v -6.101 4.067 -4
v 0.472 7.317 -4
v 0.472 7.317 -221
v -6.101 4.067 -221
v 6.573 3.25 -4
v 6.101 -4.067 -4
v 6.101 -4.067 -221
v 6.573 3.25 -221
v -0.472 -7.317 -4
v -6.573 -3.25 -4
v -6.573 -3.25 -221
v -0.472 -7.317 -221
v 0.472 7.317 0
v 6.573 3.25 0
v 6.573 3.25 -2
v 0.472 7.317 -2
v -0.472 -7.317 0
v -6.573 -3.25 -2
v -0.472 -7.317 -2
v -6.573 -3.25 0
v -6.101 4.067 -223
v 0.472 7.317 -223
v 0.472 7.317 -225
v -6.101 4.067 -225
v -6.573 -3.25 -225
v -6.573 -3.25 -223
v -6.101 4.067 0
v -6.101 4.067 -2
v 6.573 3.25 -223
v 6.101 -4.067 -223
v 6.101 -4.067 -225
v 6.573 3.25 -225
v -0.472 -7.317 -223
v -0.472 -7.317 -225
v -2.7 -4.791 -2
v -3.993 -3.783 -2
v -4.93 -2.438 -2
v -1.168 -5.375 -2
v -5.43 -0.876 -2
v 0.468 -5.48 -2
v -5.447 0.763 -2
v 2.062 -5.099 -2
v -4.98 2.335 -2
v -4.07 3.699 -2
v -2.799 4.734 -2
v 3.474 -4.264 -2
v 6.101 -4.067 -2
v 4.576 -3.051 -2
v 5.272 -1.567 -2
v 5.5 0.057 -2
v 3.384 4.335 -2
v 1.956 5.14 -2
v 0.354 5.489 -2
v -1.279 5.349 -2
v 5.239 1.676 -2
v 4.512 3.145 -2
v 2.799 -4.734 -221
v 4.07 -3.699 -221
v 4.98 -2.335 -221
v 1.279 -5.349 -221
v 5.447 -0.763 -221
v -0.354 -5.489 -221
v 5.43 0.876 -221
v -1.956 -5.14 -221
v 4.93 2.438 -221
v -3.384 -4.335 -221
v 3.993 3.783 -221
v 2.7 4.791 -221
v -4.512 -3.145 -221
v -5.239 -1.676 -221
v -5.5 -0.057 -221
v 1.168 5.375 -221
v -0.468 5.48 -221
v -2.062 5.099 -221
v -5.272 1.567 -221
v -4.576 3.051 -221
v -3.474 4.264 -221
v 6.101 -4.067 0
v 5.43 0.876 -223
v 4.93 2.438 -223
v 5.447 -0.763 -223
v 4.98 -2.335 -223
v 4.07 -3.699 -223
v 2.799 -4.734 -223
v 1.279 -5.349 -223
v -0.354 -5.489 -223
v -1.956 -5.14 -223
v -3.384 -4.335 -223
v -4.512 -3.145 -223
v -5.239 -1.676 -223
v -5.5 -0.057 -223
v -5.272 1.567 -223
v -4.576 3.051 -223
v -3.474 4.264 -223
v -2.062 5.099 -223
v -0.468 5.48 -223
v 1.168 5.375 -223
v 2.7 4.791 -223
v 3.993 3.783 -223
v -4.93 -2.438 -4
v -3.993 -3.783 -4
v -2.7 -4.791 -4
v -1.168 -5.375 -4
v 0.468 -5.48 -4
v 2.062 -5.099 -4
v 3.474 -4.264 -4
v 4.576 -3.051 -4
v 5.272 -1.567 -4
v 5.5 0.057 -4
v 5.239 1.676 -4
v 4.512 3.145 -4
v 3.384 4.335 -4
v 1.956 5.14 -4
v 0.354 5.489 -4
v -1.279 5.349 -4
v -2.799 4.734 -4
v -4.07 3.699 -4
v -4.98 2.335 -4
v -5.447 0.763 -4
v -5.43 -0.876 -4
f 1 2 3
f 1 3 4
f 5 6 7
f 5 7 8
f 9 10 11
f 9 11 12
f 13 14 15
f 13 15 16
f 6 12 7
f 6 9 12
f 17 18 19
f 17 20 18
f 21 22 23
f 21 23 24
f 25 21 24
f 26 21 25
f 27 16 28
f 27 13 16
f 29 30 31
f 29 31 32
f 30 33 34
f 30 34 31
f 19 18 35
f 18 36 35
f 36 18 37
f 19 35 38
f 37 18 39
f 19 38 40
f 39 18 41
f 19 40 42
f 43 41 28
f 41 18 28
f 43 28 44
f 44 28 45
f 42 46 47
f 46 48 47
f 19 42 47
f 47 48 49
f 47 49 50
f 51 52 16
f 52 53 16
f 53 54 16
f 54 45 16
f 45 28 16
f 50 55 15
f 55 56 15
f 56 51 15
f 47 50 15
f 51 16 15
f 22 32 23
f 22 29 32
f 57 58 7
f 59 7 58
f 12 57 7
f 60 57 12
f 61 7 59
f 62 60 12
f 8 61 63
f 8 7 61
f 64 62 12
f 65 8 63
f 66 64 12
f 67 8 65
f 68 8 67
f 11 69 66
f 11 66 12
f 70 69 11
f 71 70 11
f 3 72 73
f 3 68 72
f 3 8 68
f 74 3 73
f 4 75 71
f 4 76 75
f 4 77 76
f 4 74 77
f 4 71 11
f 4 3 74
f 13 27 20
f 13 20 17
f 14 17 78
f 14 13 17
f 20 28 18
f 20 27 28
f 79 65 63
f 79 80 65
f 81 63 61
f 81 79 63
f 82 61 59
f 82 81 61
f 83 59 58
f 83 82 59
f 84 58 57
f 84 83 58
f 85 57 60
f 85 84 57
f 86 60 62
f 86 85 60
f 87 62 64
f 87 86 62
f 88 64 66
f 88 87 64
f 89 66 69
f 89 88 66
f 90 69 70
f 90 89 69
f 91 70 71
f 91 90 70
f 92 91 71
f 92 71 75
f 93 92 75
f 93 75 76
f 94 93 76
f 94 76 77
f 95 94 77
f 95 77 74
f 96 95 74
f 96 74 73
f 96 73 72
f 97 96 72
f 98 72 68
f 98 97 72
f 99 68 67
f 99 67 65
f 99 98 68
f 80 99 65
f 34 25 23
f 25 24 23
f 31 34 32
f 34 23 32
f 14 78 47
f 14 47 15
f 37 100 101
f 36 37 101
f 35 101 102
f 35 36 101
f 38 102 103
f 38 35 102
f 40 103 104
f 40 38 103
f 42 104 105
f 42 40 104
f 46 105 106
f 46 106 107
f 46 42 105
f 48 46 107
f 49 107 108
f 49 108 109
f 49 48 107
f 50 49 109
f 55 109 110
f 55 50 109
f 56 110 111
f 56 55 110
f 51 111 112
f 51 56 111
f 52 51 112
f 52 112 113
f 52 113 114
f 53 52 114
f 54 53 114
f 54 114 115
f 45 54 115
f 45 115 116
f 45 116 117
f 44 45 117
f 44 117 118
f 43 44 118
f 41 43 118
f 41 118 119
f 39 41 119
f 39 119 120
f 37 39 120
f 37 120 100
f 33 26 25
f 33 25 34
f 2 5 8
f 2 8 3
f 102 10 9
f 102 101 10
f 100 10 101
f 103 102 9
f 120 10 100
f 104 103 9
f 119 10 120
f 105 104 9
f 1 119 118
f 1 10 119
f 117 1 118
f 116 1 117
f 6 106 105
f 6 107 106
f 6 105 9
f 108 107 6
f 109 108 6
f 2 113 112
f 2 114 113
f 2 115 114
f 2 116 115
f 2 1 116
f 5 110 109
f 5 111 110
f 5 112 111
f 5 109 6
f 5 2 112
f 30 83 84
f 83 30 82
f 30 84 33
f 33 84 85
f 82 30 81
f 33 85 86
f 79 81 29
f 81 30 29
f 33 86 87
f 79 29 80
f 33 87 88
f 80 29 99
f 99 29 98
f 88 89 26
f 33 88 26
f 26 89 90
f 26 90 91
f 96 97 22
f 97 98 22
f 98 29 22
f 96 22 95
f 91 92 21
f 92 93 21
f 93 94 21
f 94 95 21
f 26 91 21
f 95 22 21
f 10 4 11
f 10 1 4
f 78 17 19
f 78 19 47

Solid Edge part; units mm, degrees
sketch "Sketch1" plane through (0, 0, 0) normal (0, 0, 1) x (1, 0, 0)
  line L0 (-6.1009, 4.0673) -> (-6.5728, -3.2499)
  line L1 (-6.5728, -3.2499) -> (-0.4719, -7.3171)
  line L2 (-0.4719, -7.3171) -> (6.1009, -4.0673)
  line L3 (6.1009, -4.0673) -> (6.5728, 3.2499)
  line L4 (6.5728, 3.2499) -> (0.4719, 7.3171)
  line L5 (0.4719, 7.3171) -> (-6.1009, 4.0673)
extrude "Protrusion1" add sketch "Sketch1" against normal blind 225
sketch "Sketch2" plane through (0, 0, -2) normal (0, 0, 1) x (-0.8964, -0.4432, 0)
  circle A0 centre (0, 0) radius 5.5
  circle A1 centre (0, 0) radius 13.1424
extrude "ExtrudedCutout_1" cut sketch "Sketch2" against normal blind 2
sketch "Sketch3" plane through (0, 0, -223) normal (0, 0, -1) x (0.8964, 0.4432, 0)
  circle A0 centre (0, 0) radius 5.5
  circle A1 centre (0, 0) radius 13.1424
extrude "ExtrudedCutout_2" cut sketch "Sketch3" against normal blind 2
properties part number "BumbleB0197"
